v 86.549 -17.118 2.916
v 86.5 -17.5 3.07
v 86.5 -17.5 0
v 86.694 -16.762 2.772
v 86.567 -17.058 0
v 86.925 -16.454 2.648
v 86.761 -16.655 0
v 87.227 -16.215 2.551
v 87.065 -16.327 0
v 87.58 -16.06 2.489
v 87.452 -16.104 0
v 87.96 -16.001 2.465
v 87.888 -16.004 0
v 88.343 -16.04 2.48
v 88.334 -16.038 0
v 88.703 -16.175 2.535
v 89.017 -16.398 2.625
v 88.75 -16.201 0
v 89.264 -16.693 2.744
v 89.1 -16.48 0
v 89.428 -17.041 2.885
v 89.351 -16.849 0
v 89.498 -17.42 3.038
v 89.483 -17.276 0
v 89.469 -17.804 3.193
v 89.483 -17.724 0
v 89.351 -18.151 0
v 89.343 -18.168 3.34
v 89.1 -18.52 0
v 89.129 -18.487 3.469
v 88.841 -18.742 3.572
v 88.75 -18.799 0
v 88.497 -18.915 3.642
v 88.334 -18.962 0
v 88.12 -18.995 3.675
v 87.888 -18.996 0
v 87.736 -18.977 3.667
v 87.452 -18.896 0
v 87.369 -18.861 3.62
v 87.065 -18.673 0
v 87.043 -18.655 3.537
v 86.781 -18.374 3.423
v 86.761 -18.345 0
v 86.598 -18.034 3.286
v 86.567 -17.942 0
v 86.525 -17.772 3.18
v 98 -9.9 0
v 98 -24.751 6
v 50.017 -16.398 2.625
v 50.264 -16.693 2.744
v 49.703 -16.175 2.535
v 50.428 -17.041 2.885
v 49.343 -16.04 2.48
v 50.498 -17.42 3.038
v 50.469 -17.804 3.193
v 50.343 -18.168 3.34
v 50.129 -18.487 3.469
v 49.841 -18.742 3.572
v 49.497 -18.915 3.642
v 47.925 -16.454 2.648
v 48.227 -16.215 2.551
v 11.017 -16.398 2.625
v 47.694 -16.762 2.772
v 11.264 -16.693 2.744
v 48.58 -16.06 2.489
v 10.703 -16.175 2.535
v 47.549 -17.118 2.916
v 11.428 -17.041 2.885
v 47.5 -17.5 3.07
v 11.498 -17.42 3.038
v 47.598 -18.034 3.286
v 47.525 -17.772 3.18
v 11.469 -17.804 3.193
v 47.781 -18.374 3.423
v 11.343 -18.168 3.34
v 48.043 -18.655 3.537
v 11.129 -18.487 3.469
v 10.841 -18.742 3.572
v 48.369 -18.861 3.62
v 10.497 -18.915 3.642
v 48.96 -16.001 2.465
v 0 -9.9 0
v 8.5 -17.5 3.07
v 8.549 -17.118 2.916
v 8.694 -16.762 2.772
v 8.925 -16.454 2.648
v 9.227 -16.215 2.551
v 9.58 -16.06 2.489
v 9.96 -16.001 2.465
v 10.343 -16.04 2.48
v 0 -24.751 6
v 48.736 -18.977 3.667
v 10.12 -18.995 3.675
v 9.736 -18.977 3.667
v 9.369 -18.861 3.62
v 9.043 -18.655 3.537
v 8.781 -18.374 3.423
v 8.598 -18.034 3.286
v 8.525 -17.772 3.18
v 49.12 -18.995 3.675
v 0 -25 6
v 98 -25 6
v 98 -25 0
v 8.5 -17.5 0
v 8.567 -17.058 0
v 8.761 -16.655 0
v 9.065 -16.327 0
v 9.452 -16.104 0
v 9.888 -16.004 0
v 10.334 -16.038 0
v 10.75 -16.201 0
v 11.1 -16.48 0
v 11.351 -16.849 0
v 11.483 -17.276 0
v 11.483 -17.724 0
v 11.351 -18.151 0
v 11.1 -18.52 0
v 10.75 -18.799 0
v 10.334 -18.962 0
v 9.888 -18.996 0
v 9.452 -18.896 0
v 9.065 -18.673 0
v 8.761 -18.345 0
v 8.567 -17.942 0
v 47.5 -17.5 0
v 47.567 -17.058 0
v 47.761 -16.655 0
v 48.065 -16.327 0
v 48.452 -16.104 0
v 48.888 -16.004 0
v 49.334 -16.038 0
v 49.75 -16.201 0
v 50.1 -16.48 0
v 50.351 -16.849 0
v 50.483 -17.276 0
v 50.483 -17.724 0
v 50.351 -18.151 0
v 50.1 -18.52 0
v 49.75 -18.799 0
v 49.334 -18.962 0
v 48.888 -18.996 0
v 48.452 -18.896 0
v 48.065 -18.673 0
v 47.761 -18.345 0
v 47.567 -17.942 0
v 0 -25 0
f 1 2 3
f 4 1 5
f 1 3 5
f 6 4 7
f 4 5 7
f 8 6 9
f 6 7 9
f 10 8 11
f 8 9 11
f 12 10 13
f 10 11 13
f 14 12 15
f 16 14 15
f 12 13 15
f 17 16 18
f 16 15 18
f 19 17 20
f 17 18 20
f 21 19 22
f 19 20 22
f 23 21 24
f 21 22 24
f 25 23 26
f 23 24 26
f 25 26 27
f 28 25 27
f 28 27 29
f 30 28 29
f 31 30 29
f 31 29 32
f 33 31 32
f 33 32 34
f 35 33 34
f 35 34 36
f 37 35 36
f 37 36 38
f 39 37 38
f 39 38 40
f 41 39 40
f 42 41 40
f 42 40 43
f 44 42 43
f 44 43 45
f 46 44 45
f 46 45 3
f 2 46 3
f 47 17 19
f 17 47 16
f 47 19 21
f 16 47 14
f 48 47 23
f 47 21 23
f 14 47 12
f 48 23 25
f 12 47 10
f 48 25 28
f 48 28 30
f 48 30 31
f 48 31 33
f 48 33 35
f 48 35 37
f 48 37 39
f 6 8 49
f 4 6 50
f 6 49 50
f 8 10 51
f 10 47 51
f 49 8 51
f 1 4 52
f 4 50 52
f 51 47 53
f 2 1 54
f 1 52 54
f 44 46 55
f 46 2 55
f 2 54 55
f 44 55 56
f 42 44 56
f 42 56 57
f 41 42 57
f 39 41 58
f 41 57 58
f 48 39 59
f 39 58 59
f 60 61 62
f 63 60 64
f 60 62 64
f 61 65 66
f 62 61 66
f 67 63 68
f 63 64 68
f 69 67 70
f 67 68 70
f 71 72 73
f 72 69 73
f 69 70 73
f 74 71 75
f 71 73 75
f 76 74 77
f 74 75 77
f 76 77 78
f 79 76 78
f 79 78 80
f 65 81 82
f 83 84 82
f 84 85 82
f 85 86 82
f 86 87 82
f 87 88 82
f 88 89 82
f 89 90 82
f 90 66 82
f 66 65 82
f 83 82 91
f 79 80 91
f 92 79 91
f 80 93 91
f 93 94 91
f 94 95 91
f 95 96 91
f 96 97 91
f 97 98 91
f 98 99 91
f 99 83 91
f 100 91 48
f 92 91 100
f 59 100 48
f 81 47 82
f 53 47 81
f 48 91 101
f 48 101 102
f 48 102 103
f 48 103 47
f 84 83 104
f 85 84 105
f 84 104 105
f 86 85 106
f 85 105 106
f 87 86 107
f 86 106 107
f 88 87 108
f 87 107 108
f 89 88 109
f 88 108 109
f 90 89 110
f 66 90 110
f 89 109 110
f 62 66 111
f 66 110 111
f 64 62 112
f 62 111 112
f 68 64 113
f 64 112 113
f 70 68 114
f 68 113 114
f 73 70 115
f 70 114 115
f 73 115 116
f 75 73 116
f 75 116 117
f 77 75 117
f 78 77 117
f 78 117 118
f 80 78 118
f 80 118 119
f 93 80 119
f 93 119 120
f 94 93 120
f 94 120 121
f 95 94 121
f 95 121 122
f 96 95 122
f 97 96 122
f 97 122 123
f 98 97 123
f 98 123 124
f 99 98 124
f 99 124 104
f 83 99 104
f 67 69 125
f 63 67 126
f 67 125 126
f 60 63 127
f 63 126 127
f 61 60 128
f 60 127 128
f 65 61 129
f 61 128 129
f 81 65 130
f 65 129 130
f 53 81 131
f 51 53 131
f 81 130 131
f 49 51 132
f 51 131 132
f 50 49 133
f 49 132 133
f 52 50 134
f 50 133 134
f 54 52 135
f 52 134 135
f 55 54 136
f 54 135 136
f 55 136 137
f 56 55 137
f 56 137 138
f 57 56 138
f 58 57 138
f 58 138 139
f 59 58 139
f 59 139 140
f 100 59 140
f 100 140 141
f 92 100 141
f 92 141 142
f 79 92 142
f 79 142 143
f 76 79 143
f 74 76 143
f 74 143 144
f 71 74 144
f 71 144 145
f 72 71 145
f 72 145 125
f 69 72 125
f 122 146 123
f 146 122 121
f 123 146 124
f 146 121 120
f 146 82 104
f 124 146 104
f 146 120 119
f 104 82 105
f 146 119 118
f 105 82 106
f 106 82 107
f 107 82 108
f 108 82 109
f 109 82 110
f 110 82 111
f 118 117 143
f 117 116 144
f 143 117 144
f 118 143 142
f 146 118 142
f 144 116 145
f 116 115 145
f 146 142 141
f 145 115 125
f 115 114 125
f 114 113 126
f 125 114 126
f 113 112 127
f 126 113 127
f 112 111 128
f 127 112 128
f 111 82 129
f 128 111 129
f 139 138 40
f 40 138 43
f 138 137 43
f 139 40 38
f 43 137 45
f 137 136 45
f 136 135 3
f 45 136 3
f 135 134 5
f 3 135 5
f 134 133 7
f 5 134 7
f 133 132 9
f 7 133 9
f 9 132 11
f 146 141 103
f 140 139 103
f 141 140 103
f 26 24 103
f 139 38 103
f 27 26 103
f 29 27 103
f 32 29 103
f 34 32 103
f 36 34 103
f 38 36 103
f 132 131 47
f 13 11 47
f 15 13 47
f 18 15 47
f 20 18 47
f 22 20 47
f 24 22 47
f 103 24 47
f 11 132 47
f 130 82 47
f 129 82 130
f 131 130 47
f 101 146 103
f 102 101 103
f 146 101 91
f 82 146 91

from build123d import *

# Parameters (mm, degrees)
ESBO_O1_W                = 98
ESBO_O1_H                = 25
RESSALTO_EXTRUS_O1_DEPTH = 6
CHANFRO1_SIZE            = 10
CHANFRO1_SIZE_2          = 24.750868534
ESBO_O3_R                = 1.5
CORTE_EXTRUS_O1_DEPTH    = 6


with BuildPart() as part:
    # Esboço1 → Ressalto-extrusão1 (new body)
    with BuildSketch(Plane.XY):
        with Locations((49, -12.5)):
            Rectangle(ESBO_O1_W, ESBO_O1_H)
    extrude(amount=RESSALTO_EXTRUS_O1_DEPTH)

    # Chanfro1
    # the kernel refuses this chamfer: 24.750868534, 10 mm, written as the material it takes off along each edge
    with BuildSketch(Plane(origin=(-64.178729721, 0, 6), x_dir=(0, 0.0881670647319357, -0.9961057015681392), z_dir=(1, 0, 0))) as chanfro1_piece_1:
        Polygon((CHANFRO1_SIZE * 0.996105701568, -CHANFRO1_SIZE * 0.0881670647319), (-CHANFRO1_SIZE_2 * 0.0881670647325, -CHANFRO1_SIZE_2 * 0.996105701575), (0, 0), align=None)
    extrude(amount=226.357459443, mode=Mode.SUBTRACT)

    # Esboço3 → Corte-extrusão1 (cut)
    with BuildSketch(Plane(origin=(0, 0, 0), x_dir=(-1, 0, 0), z_dir=(0, 0, -1))):
        with Locations((-49, -17.5)):
            Circle(ESBO_O3_R)
        with Locations((-10, -17.5)):
            Circle(ESBO_O3_R)
        with Locations((-88, -17.5)):
            Circle(ESBO_O3_R)
    extrude(amount=-CORTE_EXTRUS_O1_DEPTH, mode=Mode.SUBTRACT)


solid = part.part
